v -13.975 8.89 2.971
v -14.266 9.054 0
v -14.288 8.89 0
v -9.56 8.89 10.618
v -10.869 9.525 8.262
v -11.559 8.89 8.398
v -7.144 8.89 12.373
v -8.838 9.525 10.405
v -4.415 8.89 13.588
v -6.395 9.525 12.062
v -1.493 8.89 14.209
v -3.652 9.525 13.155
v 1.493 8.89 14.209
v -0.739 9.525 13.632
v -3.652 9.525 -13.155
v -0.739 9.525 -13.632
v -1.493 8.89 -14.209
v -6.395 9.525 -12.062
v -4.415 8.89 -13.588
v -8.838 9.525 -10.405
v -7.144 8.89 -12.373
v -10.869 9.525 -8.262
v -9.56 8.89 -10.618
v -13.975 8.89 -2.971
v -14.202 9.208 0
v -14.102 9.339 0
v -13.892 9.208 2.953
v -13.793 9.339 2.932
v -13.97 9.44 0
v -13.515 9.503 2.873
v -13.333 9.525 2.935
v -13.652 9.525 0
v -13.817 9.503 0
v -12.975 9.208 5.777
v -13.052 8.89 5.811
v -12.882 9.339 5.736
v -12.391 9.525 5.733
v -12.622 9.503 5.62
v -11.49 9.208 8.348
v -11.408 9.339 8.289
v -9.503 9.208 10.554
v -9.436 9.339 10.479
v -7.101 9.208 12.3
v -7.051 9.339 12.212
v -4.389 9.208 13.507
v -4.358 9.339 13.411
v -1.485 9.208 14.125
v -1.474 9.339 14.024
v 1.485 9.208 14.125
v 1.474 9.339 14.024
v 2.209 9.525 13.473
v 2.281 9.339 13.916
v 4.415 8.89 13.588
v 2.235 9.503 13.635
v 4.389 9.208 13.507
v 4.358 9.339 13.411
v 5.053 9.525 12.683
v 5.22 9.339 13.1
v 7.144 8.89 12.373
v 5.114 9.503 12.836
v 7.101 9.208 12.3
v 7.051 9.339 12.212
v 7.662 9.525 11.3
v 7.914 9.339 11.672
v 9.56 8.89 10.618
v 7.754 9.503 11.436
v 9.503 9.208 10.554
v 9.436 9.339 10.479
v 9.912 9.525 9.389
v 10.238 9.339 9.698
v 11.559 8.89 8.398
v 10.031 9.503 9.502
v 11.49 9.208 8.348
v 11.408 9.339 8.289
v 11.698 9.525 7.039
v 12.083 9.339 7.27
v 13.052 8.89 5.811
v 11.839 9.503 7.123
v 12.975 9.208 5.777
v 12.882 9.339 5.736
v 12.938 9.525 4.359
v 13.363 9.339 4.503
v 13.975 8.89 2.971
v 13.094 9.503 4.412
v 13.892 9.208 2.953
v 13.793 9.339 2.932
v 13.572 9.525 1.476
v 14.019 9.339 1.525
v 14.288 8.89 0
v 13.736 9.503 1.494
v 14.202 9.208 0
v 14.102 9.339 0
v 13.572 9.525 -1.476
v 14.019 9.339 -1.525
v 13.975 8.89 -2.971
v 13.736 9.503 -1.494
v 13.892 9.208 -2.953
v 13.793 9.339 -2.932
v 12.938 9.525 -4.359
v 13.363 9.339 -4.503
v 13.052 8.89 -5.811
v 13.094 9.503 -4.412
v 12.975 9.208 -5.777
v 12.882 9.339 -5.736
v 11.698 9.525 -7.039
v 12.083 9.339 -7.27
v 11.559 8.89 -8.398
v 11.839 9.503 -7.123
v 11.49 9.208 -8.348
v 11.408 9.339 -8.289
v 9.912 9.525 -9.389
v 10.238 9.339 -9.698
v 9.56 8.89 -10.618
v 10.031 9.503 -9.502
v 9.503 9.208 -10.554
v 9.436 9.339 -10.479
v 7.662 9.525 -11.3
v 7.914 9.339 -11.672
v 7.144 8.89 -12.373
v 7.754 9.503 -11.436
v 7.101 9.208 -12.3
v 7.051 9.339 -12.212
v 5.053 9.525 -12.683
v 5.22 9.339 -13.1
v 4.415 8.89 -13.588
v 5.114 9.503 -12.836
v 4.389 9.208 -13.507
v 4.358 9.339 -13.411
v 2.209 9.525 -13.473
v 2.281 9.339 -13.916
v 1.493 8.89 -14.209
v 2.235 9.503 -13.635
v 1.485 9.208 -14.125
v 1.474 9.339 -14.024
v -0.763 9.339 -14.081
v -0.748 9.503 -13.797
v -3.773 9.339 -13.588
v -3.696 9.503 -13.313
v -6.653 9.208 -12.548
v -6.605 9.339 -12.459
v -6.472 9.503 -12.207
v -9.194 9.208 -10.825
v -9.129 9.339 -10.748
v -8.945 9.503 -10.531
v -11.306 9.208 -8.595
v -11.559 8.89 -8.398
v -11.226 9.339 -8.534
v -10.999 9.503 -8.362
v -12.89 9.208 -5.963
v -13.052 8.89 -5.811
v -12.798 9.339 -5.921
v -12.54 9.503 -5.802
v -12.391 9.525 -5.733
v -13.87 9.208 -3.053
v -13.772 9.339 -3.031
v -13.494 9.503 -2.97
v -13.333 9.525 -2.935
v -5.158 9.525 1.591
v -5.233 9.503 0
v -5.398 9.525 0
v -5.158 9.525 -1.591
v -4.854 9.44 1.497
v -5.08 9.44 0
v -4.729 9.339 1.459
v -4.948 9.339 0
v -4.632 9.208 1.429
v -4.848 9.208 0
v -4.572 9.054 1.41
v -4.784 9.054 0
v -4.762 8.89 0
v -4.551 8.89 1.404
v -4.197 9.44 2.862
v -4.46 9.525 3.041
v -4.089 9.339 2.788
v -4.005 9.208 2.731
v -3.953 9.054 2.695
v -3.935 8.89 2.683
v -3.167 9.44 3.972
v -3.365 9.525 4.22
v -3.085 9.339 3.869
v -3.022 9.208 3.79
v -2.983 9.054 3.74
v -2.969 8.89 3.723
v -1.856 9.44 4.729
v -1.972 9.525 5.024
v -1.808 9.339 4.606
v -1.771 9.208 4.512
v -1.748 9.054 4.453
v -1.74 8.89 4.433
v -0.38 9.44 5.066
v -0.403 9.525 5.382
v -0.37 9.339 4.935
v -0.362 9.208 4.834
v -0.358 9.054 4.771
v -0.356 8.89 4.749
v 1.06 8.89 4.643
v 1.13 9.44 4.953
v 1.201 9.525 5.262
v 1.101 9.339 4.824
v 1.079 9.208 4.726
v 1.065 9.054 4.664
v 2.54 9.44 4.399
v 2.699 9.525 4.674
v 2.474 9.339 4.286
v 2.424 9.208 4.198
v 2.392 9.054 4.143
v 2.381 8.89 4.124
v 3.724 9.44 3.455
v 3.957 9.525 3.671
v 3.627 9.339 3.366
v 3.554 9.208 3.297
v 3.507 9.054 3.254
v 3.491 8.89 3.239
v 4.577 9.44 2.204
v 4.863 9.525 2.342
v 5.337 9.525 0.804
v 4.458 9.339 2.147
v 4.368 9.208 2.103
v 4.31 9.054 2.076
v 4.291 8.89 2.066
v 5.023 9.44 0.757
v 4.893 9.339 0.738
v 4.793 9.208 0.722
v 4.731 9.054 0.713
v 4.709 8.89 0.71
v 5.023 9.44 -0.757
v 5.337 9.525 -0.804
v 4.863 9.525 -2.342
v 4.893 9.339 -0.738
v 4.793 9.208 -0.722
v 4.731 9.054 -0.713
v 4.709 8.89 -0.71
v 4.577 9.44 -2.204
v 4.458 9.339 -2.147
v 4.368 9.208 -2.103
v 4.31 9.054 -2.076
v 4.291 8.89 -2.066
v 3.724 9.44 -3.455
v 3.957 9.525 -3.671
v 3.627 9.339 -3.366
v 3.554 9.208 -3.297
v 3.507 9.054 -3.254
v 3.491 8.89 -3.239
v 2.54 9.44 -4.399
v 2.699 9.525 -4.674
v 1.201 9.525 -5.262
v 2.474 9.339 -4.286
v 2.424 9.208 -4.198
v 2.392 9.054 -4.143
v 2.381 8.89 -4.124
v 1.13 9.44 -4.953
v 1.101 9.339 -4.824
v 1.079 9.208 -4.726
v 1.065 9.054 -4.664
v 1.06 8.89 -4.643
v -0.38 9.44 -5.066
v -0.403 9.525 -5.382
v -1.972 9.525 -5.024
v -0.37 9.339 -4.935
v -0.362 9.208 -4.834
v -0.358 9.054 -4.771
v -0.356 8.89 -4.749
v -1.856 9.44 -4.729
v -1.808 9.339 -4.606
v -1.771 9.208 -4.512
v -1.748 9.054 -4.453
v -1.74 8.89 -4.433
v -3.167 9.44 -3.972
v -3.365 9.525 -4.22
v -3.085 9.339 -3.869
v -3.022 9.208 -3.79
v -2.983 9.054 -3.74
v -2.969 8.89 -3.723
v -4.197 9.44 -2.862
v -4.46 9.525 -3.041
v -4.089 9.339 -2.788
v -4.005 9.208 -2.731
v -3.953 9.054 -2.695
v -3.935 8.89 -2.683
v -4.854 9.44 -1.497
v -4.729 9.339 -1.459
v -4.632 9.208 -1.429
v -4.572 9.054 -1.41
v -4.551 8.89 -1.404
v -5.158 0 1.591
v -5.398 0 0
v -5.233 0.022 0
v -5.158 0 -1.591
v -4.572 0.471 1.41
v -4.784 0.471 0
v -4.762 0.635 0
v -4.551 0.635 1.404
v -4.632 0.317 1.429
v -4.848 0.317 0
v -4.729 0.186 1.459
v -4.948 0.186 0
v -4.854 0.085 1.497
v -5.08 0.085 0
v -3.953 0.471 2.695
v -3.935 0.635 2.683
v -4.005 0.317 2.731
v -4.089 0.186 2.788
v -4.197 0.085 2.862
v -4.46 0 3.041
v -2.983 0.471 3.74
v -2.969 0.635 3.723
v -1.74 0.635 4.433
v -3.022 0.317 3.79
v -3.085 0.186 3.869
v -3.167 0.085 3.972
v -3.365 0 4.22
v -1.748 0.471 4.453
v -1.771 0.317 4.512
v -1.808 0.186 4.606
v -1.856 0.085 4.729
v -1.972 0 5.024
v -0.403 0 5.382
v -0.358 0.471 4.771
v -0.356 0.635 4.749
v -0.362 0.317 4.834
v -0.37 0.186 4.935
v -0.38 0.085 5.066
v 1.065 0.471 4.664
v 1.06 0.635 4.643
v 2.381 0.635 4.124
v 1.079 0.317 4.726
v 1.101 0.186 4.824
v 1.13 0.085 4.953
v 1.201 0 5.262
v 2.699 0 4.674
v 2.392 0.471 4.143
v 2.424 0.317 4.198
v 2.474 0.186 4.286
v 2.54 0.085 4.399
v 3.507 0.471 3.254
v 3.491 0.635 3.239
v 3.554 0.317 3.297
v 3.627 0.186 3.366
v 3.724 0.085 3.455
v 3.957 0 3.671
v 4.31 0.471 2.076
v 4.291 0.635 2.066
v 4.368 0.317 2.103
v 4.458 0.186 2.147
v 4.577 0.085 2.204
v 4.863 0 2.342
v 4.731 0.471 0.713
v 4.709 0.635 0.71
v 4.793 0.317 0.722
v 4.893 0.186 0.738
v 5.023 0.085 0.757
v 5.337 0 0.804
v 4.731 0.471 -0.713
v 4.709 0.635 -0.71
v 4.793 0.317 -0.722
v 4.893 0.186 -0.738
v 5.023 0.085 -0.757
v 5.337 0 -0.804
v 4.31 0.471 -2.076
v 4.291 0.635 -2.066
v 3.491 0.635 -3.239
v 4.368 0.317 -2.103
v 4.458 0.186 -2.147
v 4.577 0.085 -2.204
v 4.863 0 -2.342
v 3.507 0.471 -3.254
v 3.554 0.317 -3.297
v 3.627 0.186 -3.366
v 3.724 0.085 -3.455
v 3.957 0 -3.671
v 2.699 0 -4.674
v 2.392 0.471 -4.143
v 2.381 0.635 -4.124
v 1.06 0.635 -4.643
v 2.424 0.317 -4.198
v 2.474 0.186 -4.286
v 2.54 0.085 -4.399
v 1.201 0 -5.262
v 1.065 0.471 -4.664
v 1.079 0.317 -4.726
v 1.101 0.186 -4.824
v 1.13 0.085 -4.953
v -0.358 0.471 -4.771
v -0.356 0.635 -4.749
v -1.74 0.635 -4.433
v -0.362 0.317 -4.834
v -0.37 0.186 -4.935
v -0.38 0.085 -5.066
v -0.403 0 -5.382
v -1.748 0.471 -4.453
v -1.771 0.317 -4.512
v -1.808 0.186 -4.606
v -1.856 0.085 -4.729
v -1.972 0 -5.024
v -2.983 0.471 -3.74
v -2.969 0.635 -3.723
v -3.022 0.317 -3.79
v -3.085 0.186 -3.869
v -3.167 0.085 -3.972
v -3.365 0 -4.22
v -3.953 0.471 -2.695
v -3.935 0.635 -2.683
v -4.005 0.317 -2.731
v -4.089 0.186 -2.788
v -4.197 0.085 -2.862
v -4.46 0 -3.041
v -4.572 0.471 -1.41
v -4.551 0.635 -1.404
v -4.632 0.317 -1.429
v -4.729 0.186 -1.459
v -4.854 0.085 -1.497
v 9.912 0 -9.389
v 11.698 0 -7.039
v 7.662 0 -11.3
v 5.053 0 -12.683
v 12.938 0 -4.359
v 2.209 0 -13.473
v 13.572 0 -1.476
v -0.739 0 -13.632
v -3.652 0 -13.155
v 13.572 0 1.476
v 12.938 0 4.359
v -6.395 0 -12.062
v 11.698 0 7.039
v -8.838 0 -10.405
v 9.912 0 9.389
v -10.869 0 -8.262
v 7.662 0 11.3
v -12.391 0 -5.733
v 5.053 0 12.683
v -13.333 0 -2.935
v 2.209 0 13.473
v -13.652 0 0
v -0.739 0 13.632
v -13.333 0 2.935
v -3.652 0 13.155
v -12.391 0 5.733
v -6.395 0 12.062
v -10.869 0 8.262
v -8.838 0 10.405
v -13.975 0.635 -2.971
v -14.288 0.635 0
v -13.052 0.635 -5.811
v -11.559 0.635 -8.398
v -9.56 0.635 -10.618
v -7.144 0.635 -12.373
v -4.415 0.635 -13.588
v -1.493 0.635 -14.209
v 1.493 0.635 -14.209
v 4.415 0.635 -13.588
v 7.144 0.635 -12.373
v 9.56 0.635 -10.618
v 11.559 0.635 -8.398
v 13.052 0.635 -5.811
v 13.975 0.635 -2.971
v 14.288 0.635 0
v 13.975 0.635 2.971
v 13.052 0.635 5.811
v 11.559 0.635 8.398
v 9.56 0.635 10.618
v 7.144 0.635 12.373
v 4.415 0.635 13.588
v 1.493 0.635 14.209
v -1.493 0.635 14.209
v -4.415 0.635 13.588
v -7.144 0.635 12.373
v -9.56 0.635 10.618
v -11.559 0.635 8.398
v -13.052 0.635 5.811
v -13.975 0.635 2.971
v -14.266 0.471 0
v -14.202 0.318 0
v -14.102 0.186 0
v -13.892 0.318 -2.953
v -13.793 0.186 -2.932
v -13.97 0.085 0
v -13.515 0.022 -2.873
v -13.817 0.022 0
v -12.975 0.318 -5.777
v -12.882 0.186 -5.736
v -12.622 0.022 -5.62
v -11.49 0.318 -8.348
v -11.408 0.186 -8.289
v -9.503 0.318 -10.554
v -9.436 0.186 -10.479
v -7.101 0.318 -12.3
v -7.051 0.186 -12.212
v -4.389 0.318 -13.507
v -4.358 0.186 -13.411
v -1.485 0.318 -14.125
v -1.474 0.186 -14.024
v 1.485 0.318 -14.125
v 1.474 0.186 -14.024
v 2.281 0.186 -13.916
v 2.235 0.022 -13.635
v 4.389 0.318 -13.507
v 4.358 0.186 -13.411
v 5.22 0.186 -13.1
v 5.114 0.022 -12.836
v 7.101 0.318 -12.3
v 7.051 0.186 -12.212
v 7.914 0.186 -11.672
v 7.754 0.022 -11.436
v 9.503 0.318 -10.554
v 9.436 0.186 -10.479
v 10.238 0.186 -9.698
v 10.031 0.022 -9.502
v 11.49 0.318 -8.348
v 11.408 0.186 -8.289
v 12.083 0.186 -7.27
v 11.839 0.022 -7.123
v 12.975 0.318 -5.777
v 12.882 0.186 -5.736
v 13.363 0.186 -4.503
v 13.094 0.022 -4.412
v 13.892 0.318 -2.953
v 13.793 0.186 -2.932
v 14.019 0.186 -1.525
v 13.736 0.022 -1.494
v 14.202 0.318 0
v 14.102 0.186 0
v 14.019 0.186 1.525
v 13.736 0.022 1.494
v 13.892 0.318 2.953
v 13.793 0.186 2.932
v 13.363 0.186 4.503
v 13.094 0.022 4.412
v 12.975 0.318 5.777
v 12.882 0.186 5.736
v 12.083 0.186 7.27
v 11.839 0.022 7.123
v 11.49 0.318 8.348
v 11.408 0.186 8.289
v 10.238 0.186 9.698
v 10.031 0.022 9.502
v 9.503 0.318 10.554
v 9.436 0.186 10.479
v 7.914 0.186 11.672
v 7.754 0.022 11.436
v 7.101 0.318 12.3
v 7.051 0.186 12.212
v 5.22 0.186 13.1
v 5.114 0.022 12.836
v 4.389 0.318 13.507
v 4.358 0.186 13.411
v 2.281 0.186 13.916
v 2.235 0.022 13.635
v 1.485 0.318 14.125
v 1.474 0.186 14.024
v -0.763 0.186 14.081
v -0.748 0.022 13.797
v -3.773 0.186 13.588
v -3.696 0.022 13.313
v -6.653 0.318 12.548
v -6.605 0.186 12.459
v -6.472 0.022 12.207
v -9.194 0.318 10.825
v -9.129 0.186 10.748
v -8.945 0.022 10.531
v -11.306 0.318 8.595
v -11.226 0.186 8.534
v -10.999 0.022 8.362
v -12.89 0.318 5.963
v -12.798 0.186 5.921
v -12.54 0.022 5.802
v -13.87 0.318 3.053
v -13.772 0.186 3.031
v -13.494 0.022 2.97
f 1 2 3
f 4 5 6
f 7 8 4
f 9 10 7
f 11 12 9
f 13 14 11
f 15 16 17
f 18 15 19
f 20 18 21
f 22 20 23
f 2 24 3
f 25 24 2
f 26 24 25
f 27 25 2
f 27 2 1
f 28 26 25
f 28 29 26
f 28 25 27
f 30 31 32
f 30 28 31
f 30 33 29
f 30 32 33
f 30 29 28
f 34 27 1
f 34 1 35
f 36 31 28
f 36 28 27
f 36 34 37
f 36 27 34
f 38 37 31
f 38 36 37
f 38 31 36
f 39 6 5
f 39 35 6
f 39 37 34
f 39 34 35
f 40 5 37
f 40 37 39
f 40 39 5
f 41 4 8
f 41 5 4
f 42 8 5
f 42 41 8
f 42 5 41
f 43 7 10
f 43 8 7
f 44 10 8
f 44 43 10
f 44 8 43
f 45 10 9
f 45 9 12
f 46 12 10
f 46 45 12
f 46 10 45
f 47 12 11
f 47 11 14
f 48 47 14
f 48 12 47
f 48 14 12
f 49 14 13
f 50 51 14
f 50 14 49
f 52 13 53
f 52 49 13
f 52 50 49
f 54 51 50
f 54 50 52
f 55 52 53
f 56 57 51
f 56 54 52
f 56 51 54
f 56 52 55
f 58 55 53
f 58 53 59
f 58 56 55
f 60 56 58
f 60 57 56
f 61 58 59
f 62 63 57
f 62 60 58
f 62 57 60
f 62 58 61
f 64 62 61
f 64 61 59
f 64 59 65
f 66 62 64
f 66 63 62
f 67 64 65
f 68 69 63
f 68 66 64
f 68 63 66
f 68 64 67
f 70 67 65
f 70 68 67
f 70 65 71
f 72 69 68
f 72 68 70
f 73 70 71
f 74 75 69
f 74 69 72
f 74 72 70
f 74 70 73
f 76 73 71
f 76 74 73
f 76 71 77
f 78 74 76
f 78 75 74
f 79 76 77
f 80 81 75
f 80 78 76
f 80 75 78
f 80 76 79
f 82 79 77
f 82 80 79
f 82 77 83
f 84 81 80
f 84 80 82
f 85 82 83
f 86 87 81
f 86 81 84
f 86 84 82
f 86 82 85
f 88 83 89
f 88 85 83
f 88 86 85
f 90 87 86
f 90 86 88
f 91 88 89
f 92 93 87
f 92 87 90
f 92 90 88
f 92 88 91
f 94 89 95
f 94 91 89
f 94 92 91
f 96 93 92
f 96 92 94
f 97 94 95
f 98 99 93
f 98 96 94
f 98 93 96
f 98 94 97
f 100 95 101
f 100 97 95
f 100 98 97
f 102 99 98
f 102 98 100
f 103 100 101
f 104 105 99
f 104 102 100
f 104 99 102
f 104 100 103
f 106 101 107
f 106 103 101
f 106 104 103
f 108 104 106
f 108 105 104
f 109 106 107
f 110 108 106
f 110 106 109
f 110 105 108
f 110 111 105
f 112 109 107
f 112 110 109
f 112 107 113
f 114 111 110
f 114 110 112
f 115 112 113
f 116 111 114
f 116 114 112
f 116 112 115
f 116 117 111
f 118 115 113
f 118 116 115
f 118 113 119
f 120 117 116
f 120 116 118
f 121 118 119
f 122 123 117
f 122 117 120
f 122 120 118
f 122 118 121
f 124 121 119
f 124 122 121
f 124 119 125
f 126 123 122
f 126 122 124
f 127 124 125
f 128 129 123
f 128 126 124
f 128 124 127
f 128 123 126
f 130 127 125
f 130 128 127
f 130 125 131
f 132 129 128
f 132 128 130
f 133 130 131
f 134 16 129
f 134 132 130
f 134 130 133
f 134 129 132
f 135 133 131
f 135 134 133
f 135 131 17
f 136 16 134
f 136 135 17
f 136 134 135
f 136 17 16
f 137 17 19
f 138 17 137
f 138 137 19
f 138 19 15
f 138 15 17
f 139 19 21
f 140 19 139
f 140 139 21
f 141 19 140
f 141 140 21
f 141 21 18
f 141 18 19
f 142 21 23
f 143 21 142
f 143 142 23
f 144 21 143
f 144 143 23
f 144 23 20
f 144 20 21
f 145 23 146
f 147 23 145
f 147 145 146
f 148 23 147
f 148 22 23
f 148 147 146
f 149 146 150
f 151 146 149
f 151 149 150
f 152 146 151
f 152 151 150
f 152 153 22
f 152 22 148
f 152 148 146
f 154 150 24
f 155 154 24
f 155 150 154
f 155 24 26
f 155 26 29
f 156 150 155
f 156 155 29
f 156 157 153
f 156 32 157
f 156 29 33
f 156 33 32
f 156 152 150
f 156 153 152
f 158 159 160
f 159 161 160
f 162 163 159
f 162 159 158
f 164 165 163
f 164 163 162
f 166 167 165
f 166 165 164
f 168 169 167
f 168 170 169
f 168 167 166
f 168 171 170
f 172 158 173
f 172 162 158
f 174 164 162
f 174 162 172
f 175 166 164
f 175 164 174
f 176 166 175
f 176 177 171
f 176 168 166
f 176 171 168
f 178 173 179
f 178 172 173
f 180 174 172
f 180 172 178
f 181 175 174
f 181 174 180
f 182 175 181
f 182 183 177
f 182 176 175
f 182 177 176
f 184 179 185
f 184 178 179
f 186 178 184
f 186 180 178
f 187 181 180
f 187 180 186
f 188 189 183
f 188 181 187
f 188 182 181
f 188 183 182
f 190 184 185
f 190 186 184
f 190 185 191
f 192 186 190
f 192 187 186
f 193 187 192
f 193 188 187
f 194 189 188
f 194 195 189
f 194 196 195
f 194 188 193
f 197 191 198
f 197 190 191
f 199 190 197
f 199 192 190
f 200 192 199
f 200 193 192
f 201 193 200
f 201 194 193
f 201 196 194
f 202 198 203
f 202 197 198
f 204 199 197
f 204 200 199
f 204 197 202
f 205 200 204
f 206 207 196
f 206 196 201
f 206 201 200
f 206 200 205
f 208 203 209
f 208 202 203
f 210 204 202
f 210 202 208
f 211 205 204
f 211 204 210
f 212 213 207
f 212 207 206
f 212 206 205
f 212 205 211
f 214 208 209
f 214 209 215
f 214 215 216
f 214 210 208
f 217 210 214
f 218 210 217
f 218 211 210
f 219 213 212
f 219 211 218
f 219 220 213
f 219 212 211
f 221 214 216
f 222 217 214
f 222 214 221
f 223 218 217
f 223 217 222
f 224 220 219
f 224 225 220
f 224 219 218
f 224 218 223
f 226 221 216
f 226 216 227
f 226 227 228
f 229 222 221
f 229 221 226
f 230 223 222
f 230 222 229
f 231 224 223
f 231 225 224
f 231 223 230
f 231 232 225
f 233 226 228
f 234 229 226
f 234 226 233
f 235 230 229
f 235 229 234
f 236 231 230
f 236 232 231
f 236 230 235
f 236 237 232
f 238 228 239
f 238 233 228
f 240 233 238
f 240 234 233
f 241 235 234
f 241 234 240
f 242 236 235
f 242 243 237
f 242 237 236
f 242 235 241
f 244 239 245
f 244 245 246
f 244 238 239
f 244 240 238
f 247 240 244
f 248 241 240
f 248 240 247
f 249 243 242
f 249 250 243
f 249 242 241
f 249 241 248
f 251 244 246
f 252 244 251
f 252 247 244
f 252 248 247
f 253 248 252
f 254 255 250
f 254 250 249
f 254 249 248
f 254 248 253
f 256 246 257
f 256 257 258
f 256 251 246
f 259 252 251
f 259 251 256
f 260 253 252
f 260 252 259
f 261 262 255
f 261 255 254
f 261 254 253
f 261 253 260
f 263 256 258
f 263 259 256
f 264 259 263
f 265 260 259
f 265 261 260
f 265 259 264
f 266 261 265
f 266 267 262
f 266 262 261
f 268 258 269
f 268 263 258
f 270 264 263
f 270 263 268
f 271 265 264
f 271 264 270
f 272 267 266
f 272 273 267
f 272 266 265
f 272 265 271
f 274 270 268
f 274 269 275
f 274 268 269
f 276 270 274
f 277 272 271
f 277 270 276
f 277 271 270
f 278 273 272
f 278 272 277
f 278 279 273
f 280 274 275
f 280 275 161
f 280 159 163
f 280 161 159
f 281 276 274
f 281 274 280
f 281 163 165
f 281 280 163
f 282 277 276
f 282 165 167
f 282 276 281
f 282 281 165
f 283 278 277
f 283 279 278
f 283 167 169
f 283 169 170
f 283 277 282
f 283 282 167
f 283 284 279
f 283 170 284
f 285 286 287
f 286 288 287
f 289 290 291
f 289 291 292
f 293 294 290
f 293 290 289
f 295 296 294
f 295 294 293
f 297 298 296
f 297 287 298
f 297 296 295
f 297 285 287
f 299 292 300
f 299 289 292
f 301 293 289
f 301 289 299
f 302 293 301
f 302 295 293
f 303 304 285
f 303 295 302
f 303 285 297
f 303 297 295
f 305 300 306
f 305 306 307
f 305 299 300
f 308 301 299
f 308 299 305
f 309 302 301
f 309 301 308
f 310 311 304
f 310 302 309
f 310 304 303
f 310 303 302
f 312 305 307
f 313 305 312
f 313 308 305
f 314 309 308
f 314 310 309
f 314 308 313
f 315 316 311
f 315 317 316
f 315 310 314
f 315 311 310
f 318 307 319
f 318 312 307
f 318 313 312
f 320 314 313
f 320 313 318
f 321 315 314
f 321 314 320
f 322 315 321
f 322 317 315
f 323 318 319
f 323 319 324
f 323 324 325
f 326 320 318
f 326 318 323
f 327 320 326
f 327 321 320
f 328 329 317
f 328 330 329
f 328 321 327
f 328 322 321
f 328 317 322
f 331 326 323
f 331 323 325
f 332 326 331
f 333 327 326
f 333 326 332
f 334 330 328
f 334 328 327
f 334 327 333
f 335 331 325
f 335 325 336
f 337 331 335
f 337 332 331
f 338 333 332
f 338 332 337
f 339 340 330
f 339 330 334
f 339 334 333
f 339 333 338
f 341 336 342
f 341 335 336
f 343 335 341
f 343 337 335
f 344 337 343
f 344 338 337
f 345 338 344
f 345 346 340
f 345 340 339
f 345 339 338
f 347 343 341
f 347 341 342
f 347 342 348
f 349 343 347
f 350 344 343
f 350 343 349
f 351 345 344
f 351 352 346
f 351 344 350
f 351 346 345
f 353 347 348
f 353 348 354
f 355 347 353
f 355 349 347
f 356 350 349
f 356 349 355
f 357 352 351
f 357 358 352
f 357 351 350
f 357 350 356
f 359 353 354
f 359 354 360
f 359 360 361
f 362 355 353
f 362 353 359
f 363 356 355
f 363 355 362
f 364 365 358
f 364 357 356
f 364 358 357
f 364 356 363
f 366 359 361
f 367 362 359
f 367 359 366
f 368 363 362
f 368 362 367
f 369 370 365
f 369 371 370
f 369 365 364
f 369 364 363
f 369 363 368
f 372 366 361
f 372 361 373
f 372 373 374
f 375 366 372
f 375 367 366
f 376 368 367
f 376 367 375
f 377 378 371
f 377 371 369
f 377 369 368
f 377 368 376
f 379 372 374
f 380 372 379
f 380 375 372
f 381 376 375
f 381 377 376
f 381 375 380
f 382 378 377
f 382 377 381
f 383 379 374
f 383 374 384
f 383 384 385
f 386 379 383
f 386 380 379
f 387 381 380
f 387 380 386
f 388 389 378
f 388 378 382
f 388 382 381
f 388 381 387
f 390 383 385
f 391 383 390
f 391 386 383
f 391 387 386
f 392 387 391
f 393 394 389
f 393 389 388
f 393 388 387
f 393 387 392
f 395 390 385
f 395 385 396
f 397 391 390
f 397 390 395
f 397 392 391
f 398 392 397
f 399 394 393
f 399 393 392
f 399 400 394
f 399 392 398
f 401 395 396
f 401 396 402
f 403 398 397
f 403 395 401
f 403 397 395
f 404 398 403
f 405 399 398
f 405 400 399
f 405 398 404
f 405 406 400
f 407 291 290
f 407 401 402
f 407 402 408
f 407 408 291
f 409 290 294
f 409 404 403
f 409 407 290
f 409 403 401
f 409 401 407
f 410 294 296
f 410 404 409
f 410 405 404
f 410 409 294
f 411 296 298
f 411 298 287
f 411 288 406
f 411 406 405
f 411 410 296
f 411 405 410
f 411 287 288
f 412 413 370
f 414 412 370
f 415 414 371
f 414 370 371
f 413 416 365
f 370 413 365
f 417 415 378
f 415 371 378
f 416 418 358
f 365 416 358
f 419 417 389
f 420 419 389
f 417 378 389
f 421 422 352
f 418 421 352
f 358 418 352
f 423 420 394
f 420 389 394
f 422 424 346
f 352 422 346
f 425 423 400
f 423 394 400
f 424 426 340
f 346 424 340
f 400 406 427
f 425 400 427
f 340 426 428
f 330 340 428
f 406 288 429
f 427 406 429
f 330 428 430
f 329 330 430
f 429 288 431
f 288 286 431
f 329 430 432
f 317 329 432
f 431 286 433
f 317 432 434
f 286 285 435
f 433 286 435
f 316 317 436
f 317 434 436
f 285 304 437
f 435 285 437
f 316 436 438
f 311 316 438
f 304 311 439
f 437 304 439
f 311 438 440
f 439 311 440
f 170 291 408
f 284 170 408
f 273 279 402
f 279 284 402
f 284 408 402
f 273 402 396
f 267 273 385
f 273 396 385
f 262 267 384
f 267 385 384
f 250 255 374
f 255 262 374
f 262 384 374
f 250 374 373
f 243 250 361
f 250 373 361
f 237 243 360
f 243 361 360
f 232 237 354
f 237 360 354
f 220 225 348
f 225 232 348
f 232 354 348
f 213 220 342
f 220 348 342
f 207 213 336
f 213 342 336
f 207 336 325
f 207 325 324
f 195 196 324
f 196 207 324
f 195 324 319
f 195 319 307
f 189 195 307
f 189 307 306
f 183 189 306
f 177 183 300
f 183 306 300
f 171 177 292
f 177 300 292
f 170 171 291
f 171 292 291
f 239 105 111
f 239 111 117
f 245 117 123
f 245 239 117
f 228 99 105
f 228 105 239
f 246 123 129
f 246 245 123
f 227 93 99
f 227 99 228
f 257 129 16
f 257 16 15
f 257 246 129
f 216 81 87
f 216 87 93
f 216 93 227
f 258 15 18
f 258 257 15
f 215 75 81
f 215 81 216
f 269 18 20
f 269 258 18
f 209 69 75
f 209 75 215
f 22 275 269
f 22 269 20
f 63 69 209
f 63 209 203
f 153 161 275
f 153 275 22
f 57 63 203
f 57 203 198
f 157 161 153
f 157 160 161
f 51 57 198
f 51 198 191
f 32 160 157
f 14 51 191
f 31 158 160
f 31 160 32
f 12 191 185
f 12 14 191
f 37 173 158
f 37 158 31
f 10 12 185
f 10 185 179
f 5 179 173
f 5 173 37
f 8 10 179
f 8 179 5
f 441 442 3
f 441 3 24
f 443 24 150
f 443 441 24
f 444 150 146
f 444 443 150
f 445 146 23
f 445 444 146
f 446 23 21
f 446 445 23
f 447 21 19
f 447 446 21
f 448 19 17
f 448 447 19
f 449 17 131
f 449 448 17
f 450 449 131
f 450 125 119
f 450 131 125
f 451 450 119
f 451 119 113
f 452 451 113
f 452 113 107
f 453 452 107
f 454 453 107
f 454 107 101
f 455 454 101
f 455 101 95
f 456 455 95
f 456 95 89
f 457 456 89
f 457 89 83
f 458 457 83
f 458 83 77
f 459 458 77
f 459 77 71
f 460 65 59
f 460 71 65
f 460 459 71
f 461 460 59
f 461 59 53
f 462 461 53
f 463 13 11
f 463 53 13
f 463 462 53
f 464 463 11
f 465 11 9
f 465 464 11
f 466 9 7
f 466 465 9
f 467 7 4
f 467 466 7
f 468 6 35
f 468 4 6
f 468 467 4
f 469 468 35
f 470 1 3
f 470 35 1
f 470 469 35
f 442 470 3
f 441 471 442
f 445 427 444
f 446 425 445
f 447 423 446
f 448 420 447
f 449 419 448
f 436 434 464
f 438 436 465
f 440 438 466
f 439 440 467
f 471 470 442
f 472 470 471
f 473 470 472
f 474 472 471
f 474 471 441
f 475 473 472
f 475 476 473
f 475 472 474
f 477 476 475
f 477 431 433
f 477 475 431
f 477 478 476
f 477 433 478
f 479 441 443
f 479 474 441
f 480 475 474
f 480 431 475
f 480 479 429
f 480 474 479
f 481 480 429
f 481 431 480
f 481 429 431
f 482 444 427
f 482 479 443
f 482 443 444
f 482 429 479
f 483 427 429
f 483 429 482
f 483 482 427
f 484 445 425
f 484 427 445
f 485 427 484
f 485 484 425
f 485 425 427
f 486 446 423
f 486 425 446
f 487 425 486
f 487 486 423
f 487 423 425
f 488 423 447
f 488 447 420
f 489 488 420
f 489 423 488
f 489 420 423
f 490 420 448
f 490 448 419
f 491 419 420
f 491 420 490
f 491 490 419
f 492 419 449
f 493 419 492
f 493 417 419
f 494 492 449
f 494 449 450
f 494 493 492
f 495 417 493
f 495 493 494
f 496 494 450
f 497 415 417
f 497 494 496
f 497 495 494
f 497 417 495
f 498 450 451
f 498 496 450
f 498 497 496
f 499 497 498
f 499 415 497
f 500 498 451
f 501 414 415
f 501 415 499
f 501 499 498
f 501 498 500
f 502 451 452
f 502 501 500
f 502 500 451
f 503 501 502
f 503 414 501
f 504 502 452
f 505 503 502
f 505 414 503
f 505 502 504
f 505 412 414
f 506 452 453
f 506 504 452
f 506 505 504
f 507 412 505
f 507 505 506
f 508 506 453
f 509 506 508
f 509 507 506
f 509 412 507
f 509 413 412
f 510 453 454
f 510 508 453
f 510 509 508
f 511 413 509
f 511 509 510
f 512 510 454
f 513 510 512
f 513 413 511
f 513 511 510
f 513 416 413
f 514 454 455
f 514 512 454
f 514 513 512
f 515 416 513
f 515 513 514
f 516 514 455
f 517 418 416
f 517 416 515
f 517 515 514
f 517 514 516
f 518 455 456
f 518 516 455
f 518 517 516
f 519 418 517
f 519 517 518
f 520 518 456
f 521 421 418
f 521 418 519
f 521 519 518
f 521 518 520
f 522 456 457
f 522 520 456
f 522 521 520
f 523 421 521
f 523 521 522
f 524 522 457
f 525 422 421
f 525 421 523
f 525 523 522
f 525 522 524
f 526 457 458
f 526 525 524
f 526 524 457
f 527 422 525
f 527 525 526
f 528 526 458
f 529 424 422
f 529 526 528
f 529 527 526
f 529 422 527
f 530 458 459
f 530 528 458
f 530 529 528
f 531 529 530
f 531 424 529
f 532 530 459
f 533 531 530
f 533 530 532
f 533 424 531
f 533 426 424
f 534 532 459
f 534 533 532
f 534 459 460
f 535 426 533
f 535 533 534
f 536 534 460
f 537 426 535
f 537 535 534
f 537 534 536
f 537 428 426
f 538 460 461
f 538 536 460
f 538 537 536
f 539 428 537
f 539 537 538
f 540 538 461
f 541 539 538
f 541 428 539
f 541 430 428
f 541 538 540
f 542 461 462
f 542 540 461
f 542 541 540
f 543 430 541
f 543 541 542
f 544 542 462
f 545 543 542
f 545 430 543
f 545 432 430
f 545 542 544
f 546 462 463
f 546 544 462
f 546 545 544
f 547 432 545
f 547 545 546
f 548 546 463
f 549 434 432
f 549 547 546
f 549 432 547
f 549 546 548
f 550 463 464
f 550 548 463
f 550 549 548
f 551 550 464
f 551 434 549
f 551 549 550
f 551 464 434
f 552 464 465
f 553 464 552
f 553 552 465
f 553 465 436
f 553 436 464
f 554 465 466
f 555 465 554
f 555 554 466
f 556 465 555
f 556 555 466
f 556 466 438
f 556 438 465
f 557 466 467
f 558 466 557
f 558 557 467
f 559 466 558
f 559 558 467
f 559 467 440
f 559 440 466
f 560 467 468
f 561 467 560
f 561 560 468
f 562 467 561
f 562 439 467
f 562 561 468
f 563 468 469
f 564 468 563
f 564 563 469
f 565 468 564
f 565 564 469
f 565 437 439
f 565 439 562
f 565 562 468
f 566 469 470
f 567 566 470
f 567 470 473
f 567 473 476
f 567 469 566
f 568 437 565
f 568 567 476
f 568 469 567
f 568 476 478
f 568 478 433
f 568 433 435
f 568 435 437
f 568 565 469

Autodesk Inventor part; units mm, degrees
ref_plane "YZ Plane" through (0, 0, 0) normal (1, 0, 0) x (0, 1, 0)
ref_plane "XZ Plane" through (0, 0, 0) normal (0, 1, 0) x (-1, 0, 0)
ref_plane "XY Plane" through (0, 0, 0) normal (0, 0, 1) x (1, 0, 0)
sketch "Sketch1" plane through (0, 0, 0) normal (0, 1, 0) x (-1, 0, 0)
  circle A0 centre (0, 0) radius 4.7625
  circle A1 centre (0, 0) radius 14.2875
  dimension "d0" = 9.525
  dimension "d1" = 28.575
extrude "Extrusion1" add sketch "Sketch1" along normal blind 9.525
fillet "Fillet1" radius 0.635 1 edges at (14.2875, 9.525, 0)
fillet "Fillet2" radius 0.635 1 edges at (14.2875, 0, 0)
fillet "Fillet3" radius 0.635 1 edges at (4.7625, 9.525, 0)
fillet "Fillet4" radius 0.635 1 edges at (4.7625, 0, 0)
properties part number "1614zz bearing"
